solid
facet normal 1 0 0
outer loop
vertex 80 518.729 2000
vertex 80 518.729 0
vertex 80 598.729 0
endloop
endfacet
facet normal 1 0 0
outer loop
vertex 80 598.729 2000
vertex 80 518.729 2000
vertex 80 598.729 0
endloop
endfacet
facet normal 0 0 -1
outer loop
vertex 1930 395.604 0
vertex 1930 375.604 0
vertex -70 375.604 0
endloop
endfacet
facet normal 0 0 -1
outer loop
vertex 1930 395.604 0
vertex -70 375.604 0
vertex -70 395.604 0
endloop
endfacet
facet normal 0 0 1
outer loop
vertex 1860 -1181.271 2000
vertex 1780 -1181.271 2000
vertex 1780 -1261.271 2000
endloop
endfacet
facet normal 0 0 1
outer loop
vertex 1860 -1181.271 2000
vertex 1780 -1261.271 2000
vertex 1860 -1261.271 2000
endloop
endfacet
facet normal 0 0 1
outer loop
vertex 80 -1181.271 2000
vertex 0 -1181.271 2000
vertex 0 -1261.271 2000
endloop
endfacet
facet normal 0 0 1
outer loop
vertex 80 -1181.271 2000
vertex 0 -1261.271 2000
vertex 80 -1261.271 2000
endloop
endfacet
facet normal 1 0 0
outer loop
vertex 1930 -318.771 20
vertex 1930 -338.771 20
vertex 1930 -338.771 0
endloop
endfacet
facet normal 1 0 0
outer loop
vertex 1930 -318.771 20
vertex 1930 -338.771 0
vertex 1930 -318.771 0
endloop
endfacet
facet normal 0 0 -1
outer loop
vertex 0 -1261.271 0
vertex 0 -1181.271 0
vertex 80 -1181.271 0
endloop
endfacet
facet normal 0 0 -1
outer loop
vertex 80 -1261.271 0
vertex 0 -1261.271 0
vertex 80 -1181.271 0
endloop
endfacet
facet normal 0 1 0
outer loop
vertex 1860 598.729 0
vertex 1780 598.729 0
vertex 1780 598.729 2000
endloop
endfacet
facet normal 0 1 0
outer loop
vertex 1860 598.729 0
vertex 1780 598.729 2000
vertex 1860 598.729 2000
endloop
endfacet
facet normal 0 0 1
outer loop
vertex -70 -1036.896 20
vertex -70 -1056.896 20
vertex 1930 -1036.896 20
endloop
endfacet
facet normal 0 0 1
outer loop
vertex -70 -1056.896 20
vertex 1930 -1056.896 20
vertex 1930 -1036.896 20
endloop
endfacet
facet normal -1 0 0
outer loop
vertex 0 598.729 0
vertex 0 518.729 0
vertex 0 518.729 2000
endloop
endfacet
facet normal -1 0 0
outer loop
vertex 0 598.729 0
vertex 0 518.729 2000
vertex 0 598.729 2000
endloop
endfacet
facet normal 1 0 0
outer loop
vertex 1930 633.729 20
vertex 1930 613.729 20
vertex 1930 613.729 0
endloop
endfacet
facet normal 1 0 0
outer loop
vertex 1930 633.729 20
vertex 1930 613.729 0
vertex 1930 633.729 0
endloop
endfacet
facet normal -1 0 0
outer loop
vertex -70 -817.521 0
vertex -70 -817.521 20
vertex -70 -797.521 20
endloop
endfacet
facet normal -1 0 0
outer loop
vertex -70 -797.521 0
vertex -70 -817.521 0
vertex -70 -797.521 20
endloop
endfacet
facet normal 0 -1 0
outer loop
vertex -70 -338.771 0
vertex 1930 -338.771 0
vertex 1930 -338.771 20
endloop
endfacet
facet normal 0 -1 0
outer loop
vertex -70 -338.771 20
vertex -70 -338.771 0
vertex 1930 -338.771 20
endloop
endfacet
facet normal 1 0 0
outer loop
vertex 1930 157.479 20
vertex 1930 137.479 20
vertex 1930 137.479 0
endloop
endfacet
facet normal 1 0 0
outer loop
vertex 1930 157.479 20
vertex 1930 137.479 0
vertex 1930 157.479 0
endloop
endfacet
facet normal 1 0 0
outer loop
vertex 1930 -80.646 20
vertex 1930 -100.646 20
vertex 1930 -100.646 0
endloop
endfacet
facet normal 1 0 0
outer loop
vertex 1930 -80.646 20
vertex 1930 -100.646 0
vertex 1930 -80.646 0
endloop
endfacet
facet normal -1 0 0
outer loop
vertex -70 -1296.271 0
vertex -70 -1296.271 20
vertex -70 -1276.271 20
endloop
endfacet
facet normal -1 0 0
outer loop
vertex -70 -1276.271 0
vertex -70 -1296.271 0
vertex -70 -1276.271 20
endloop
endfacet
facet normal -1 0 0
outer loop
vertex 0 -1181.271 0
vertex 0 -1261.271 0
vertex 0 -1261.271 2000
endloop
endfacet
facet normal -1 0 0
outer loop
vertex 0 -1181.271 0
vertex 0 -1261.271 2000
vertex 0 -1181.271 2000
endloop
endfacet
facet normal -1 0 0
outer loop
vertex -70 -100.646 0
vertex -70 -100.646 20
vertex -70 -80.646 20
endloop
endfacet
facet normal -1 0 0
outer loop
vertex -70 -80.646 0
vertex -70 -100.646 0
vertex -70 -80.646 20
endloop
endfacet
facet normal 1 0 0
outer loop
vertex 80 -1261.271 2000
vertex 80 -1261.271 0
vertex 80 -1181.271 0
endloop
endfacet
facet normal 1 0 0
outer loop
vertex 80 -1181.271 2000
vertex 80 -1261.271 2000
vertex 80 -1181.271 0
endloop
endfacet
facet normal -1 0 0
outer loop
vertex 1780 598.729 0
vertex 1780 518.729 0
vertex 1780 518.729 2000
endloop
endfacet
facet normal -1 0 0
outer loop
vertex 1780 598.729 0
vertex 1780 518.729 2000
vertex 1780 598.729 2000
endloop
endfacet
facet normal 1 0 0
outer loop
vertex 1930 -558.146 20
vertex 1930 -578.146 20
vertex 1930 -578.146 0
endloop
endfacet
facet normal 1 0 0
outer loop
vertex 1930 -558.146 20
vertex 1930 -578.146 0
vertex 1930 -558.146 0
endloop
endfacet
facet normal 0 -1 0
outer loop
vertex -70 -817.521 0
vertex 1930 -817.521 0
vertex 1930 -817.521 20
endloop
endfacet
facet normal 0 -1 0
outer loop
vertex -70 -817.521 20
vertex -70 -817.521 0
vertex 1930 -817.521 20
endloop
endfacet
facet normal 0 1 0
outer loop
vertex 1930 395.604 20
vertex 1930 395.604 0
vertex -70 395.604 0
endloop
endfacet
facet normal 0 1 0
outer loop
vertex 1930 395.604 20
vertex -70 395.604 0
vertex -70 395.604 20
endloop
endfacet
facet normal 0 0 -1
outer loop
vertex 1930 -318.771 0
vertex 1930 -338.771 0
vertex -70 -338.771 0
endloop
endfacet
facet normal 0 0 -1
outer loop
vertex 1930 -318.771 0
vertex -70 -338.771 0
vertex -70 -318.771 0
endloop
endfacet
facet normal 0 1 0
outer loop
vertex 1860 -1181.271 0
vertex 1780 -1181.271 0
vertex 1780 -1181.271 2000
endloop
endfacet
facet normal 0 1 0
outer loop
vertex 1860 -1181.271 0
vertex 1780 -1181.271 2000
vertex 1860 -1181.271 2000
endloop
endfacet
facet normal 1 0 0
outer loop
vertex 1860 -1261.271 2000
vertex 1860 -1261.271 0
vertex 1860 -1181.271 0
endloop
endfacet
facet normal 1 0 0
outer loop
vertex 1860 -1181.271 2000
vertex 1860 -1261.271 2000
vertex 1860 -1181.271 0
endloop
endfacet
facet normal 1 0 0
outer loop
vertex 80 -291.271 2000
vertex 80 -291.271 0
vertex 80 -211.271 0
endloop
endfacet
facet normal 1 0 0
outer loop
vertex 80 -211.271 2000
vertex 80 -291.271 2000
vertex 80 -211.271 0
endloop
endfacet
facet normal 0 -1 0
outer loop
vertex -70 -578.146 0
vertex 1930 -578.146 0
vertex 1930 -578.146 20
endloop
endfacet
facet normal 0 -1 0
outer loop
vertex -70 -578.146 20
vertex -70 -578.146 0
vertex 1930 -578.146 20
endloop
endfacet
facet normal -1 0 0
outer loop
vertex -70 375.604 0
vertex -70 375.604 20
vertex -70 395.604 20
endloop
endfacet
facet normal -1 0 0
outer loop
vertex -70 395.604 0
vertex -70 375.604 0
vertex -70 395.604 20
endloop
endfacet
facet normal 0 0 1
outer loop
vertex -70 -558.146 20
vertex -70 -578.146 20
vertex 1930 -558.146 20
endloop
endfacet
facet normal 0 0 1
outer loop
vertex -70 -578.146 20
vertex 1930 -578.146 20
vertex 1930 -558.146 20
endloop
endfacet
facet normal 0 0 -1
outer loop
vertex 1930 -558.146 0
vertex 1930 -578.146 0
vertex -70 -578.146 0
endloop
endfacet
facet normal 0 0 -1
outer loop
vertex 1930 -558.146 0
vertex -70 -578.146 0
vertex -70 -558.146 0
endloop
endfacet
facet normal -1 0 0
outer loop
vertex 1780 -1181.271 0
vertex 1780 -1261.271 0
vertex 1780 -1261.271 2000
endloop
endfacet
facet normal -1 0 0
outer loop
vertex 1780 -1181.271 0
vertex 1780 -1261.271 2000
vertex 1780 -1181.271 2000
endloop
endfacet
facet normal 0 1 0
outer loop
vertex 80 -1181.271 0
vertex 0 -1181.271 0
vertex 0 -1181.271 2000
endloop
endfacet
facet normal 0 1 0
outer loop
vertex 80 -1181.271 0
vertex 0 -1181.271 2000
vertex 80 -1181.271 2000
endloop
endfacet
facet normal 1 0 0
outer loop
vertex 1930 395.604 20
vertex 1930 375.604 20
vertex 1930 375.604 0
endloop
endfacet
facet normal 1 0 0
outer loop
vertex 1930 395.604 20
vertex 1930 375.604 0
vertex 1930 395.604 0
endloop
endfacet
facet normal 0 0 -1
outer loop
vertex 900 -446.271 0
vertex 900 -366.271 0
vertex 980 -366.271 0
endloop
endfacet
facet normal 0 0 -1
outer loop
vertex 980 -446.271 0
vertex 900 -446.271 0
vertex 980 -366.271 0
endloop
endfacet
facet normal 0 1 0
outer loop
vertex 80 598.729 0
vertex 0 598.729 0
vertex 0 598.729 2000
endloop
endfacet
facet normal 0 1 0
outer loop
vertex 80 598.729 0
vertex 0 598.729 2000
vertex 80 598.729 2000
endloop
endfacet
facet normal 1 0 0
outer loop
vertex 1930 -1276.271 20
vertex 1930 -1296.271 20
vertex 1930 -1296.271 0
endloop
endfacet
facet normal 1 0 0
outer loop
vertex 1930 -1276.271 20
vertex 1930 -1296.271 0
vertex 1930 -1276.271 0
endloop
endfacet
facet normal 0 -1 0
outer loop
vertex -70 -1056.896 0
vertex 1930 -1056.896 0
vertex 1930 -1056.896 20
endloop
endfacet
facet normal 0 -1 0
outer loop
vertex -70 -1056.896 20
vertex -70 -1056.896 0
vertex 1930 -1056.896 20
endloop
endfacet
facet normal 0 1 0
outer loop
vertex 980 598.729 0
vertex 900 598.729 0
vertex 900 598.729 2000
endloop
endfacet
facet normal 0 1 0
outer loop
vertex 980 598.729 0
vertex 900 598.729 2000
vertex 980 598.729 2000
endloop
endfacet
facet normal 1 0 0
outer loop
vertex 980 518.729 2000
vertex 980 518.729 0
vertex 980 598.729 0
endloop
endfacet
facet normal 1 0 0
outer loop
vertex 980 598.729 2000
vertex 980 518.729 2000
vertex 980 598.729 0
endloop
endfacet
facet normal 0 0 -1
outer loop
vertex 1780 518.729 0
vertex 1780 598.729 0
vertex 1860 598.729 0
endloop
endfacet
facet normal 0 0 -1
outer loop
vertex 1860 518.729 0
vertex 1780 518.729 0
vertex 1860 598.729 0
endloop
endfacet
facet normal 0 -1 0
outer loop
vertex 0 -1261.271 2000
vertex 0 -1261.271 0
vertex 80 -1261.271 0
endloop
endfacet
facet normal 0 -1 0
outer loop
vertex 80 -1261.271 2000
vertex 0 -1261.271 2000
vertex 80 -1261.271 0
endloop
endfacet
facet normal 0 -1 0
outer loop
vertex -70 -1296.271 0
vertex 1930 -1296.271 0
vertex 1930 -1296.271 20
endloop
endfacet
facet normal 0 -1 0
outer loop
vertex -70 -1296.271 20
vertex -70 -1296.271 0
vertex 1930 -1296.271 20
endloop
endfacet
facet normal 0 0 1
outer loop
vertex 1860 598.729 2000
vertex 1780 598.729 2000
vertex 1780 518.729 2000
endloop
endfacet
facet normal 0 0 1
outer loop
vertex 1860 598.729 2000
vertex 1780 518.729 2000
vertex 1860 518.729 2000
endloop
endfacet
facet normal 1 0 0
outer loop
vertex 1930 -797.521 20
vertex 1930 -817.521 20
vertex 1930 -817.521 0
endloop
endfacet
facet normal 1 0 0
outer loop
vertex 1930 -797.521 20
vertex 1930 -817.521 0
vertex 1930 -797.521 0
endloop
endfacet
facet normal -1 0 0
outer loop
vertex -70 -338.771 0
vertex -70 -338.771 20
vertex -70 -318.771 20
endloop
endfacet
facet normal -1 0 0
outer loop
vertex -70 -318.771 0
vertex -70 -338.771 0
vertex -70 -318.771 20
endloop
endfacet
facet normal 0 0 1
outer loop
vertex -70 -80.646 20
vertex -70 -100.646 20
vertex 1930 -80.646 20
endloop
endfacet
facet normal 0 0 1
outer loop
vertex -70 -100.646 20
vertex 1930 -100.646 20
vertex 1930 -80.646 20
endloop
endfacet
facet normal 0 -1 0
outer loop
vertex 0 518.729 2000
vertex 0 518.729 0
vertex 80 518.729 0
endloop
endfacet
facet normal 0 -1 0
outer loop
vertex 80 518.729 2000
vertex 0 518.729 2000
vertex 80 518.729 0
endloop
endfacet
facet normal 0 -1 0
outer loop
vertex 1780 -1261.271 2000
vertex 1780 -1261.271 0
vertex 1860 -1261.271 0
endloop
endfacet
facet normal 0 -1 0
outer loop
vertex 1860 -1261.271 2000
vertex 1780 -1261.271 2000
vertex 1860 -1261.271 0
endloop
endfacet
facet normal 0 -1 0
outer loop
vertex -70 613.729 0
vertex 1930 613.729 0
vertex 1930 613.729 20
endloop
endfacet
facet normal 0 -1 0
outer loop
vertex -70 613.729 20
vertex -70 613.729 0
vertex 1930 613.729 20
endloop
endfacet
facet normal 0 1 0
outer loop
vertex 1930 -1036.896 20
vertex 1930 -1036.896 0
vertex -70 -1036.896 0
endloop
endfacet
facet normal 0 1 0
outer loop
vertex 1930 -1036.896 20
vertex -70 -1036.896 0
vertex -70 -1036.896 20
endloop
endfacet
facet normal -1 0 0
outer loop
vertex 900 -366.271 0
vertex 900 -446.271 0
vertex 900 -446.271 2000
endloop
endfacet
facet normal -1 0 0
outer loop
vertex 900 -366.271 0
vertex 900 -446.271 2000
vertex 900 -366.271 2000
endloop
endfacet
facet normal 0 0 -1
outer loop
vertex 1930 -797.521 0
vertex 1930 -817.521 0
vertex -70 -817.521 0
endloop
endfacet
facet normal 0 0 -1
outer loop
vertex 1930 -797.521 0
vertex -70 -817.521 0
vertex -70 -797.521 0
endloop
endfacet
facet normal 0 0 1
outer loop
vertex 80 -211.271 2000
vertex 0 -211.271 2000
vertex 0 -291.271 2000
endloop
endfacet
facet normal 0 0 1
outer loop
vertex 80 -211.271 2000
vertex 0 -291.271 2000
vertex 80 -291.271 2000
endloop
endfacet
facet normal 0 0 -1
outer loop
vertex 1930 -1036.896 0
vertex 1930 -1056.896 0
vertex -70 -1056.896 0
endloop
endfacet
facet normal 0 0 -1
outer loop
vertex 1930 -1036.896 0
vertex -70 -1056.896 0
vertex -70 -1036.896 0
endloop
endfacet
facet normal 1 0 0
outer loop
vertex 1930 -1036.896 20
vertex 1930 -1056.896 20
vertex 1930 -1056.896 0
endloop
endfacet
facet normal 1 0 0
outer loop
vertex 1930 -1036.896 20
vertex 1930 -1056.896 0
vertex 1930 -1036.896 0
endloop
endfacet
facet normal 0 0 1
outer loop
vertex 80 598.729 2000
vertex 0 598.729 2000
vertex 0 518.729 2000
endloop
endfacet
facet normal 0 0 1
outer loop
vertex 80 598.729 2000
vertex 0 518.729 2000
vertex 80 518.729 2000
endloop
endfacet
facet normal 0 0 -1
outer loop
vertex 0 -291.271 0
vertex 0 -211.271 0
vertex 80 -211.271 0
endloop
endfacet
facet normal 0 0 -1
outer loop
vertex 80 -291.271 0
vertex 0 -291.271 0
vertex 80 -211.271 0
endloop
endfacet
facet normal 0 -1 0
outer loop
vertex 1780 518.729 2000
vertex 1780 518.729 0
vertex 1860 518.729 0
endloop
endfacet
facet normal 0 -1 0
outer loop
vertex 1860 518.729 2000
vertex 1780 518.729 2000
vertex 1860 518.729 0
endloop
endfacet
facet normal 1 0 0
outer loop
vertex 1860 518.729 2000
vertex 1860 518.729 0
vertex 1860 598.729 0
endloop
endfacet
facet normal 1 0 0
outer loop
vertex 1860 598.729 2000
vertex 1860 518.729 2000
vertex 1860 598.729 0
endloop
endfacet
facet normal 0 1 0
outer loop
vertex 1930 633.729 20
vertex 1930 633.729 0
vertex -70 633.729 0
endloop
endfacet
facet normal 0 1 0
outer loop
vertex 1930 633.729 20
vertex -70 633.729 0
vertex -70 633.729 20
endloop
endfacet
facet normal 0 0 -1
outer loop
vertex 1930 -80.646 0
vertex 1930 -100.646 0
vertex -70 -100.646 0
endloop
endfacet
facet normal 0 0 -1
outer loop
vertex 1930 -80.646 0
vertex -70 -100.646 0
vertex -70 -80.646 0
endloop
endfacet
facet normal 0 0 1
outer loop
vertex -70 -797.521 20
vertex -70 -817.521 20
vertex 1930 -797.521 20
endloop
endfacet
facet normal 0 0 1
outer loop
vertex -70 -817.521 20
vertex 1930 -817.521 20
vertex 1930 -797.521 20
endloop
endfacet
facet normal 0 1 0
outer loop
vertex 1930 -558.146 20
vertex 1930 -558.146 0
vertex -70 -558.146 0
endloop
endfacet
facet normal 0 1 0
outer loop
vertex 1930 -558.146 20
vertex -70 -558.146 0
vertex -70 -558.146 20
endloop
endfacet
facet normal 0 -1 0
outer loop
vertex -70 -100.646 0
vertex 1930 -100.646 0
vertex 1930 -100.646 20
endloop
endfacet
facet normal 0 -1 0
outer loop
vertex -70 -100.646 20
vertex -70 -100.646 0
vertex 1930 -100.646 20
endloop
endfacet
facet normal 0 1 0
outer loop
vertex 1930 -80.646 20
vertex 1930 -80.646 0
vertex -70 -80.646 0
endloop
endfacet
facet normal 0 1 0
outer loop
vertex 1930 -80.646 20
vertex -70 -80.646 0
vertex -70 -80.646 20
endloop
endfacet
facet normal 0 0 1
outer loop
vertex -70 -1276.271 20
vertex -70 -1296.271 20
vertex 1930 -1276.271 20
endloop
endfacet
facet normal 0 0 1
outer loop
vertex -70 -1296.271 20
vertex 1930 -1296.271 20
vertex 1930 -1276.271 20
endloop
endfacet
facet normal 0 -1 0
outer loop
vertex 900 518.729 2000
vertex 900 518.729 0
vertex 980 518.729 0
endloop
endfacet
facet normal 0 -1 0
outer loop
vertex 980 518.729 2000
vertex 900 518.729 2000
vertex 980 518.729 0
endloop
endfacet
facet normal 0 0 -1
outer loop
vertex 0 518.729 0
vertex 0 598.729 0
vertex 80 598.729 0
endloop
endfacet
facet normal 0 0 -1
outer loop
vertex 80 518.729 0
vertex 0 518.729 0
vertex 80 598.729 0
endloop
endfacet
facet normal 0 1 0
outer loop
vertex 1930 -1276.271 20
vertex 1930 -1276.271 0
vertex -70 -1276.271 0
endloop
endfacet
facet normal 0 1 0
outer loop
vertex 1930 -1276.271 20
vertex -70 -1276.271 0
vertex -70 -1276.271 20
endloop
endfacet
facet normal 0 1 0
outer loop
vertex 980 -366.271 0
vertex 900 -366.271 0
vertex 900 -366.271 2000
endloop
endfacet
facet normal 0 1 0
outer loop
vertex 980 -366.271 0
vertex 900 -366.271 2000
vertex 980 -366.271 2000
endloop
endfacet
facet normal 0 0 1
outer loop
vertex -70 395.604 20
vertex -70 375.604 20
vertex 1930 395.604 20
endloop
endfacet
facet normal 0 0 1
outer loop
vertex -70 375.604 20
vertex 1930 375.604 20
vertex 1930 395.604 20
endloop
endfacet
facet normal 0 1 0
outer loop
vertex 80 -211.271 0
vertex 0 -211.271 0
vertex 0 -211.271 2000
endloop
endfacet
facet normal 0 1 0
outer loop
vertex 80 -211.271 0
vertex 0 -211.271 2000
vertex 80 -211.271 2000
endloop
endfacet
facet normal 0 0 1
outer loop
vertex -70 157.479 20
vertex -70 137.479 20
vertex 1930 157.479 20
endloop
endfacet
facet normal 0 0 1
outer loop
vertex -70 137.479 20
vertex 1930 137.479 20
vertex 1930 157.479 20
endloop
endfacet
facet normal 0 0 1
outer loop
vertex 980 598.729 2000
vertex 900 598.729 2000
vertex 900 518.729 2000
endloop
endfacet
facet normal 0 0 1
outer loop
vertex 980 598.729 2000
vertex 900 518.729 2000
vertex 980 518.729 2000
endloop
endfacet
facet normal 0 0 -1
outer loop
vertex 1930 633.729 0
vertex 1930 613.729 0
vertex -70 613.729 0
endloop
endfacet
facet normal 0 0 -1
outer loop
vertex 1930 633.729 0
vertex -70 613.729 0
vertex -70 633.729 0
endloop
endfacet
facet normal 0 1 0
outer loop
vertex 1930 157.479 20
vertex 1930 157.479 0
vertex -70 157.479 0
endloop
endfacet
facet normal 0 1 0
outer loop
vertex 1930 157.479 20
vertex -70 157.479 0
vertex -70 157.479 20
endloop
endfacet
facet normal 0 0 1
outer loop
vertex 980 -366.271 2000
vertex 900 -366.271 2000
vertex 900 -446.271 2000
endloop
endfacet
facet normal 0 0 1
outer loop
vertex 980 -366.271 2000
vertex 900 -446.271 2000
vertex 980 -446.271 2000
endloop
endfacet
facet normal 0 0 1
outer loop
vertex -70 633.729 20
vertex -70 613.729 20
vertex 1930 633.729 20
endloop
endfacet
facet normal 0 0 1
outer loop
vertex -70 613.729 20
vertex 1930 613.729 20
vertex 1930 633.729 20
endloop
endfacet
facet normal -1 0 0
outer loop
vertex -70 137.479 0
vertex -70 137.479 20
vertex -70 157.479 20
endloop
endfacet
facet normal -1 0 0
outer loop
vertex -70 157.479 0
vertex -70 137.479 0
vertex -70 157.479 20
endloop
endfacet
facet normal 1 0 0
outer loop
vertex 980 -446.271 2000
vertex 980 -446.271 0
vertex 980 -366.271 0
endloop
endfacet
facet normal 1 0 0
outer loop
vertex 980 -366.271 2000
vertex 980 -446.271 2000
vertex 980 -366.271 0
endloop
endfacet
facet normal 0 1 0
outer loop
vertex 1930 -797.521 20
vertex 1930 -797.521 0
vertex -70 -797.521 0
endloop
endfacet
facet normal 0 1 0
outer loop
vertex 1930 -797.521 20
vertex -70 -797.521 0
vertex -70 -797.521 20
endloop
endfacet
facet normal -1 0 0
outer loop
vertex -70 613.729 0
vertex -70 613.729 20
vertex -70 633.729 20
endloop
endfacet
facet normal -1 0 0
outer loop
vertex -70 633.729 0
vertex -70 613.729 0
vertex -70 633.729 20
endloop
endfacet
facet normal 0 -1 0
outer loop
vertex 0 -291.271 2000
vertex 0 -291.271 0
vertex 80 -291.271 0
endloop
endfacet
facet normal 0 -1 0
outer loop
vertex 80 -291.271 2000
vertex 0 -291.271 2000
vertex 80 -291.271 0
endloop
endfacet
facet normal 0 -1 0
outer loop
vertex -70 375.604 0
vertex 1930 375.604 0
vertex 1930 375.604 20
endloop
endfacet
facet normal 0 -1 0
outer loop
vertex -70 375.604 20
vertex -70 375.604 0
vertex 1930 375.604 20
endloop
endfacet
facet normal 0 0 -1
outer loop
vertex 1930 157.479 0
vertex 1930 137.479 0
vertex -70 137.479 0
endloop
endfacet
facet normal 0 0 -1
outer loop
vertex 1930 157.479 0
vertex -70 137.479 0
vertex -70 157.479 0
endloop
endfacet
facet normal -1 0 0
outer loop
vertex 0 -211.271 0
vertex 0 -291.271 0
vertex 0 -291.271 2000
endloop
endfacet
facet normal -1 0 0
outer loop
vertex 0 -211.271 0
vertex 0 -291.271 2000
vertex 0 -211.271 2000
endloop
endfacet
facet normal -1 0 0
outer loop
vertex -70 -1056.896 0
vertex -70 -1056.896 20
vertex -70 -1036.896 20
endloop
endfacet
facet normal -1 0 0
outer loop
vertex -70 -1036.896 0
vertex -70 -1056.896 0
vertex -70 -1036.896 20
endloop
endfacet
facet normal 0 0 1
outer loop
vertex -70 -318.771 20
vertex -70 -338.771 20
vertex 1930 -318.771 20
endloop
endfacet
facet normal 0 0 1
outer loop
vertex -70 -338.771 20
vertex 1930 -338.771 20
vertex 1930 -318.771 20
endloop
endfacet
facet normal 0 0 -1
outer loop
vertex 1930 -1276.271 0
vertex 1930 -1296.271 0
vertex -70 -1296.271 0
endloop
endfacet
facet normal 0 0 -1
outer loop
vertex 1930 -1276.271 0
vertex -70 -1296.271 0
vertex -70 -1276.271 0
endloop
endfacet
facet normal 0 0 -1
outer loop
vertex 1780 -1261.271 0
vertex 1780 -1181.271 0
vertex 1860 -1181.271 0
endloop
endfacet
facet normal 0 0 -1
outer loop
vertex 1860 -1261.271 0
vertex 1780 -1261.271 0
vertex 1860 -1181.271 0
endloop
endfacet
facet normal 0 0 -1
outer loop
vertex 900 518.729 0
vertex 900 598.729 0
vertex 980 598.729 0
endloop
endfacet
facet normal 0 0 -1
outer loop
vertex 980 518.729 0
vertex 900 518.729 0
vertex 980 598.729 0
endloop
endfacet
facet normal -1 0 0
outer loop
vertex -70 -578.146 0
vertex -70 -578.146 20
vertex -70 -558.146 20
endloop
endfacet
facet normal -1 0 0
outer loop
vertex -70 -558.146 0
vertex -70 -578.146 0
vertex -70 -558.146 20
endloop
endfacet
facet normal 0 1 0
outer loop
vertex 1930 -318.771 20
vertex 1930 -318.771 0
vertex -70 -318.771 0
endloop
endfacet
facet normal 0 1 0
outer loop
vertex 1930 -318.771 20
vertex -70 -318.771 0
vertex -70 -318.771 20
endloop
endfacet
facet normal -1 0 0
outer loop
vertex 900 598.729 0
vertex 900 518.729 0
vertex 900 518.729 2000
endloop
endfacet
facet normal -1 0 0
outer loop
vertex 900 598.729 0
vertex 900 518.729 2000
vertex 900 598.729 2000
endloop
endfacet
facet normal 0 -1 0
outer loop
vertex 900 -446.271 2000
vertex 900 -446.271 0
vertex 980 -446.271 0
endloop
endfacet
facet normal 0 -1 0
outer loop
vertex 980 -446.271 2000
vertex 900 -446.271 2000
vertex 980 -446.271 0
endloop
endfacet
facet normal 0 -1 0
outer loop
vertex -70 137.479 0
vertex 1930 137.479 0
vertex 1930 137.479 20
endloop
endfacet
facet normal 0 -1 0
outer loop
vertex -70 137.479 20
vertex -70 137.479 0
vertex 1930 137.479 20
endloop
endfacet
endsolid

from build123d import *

# Parameters (mm, degrees)
F0_W          = 80
F0_H          = 80
F1_DEPTH      = 2000
F2_W          = 20
F2_H          = 20
F3_DEPTH      = 1930
F3_DEPTH_BACK = 70


with BuildPart() as f1:
    # F0 (on Top) → F1 (new body)
    with BuildSketch(Plane.XY):
        with Locations((940, 558.728556)):
            Rectangle(F0_W, F0_H)
        with Locations((40, 558.728556)):
            Rectangle(F0_W, F0_H)
        with Locations((40, -251.271444)):
            Rectangle(F0_W, F0_H)
        with Locations((40, -1221.271444)):
            Rectangle(F0_W, F0_H)
        with Locations((940, -406.271444)):
            Rectangle(F0_W, F0_H)
        with Locations((1820, 558.728556)):
            Rectangle(F0_W, F0_H)
        with Locations((1820, -1221.271444)):
            Rectangle(F0_W, F0_H)
    extrude(amount=F1_DEPTH)


with BuildPart() as f3:
    # F2 (on Right) → F3 (new body, two sides)
    with BuildSketch(Plane.YZ) as f3_sk:
        with Locations((-1286.271444, 10)):
            Rectangle(F2_W, F2_H)
        with Locations((-1046.896444, 10)):
            Rectangle(F2_W, F2_H)
        with Locations((-807.521444, 10)):
            Rectangle(F2_W, F2_H)
        with Locations((-568.146444, 10)):
            Rectangle(F2_W, F2_H)
        with Locations((-328.771444, 10)):
            Rectangle(F2_W, F2_H)
        with Locations((-90.646444, 10)):
            Rectangle(F2_W, F2_H)
        with Locations((147.478556, 10)):
            Rectangle(F2_W, F2_H)
        with Locations((385.603556, 10)):
            Rectangle(F2_W, F2_H)
        with Locations((623.728556, 10)):
            Rectangle(F2_W, F2_H)
    extrude(amount=F3_DEPTH)
    extrude(f3_sk.sketch, amount=-F3_DEPTH_BACK)


solid = Compound([f1.part, f3.part])
